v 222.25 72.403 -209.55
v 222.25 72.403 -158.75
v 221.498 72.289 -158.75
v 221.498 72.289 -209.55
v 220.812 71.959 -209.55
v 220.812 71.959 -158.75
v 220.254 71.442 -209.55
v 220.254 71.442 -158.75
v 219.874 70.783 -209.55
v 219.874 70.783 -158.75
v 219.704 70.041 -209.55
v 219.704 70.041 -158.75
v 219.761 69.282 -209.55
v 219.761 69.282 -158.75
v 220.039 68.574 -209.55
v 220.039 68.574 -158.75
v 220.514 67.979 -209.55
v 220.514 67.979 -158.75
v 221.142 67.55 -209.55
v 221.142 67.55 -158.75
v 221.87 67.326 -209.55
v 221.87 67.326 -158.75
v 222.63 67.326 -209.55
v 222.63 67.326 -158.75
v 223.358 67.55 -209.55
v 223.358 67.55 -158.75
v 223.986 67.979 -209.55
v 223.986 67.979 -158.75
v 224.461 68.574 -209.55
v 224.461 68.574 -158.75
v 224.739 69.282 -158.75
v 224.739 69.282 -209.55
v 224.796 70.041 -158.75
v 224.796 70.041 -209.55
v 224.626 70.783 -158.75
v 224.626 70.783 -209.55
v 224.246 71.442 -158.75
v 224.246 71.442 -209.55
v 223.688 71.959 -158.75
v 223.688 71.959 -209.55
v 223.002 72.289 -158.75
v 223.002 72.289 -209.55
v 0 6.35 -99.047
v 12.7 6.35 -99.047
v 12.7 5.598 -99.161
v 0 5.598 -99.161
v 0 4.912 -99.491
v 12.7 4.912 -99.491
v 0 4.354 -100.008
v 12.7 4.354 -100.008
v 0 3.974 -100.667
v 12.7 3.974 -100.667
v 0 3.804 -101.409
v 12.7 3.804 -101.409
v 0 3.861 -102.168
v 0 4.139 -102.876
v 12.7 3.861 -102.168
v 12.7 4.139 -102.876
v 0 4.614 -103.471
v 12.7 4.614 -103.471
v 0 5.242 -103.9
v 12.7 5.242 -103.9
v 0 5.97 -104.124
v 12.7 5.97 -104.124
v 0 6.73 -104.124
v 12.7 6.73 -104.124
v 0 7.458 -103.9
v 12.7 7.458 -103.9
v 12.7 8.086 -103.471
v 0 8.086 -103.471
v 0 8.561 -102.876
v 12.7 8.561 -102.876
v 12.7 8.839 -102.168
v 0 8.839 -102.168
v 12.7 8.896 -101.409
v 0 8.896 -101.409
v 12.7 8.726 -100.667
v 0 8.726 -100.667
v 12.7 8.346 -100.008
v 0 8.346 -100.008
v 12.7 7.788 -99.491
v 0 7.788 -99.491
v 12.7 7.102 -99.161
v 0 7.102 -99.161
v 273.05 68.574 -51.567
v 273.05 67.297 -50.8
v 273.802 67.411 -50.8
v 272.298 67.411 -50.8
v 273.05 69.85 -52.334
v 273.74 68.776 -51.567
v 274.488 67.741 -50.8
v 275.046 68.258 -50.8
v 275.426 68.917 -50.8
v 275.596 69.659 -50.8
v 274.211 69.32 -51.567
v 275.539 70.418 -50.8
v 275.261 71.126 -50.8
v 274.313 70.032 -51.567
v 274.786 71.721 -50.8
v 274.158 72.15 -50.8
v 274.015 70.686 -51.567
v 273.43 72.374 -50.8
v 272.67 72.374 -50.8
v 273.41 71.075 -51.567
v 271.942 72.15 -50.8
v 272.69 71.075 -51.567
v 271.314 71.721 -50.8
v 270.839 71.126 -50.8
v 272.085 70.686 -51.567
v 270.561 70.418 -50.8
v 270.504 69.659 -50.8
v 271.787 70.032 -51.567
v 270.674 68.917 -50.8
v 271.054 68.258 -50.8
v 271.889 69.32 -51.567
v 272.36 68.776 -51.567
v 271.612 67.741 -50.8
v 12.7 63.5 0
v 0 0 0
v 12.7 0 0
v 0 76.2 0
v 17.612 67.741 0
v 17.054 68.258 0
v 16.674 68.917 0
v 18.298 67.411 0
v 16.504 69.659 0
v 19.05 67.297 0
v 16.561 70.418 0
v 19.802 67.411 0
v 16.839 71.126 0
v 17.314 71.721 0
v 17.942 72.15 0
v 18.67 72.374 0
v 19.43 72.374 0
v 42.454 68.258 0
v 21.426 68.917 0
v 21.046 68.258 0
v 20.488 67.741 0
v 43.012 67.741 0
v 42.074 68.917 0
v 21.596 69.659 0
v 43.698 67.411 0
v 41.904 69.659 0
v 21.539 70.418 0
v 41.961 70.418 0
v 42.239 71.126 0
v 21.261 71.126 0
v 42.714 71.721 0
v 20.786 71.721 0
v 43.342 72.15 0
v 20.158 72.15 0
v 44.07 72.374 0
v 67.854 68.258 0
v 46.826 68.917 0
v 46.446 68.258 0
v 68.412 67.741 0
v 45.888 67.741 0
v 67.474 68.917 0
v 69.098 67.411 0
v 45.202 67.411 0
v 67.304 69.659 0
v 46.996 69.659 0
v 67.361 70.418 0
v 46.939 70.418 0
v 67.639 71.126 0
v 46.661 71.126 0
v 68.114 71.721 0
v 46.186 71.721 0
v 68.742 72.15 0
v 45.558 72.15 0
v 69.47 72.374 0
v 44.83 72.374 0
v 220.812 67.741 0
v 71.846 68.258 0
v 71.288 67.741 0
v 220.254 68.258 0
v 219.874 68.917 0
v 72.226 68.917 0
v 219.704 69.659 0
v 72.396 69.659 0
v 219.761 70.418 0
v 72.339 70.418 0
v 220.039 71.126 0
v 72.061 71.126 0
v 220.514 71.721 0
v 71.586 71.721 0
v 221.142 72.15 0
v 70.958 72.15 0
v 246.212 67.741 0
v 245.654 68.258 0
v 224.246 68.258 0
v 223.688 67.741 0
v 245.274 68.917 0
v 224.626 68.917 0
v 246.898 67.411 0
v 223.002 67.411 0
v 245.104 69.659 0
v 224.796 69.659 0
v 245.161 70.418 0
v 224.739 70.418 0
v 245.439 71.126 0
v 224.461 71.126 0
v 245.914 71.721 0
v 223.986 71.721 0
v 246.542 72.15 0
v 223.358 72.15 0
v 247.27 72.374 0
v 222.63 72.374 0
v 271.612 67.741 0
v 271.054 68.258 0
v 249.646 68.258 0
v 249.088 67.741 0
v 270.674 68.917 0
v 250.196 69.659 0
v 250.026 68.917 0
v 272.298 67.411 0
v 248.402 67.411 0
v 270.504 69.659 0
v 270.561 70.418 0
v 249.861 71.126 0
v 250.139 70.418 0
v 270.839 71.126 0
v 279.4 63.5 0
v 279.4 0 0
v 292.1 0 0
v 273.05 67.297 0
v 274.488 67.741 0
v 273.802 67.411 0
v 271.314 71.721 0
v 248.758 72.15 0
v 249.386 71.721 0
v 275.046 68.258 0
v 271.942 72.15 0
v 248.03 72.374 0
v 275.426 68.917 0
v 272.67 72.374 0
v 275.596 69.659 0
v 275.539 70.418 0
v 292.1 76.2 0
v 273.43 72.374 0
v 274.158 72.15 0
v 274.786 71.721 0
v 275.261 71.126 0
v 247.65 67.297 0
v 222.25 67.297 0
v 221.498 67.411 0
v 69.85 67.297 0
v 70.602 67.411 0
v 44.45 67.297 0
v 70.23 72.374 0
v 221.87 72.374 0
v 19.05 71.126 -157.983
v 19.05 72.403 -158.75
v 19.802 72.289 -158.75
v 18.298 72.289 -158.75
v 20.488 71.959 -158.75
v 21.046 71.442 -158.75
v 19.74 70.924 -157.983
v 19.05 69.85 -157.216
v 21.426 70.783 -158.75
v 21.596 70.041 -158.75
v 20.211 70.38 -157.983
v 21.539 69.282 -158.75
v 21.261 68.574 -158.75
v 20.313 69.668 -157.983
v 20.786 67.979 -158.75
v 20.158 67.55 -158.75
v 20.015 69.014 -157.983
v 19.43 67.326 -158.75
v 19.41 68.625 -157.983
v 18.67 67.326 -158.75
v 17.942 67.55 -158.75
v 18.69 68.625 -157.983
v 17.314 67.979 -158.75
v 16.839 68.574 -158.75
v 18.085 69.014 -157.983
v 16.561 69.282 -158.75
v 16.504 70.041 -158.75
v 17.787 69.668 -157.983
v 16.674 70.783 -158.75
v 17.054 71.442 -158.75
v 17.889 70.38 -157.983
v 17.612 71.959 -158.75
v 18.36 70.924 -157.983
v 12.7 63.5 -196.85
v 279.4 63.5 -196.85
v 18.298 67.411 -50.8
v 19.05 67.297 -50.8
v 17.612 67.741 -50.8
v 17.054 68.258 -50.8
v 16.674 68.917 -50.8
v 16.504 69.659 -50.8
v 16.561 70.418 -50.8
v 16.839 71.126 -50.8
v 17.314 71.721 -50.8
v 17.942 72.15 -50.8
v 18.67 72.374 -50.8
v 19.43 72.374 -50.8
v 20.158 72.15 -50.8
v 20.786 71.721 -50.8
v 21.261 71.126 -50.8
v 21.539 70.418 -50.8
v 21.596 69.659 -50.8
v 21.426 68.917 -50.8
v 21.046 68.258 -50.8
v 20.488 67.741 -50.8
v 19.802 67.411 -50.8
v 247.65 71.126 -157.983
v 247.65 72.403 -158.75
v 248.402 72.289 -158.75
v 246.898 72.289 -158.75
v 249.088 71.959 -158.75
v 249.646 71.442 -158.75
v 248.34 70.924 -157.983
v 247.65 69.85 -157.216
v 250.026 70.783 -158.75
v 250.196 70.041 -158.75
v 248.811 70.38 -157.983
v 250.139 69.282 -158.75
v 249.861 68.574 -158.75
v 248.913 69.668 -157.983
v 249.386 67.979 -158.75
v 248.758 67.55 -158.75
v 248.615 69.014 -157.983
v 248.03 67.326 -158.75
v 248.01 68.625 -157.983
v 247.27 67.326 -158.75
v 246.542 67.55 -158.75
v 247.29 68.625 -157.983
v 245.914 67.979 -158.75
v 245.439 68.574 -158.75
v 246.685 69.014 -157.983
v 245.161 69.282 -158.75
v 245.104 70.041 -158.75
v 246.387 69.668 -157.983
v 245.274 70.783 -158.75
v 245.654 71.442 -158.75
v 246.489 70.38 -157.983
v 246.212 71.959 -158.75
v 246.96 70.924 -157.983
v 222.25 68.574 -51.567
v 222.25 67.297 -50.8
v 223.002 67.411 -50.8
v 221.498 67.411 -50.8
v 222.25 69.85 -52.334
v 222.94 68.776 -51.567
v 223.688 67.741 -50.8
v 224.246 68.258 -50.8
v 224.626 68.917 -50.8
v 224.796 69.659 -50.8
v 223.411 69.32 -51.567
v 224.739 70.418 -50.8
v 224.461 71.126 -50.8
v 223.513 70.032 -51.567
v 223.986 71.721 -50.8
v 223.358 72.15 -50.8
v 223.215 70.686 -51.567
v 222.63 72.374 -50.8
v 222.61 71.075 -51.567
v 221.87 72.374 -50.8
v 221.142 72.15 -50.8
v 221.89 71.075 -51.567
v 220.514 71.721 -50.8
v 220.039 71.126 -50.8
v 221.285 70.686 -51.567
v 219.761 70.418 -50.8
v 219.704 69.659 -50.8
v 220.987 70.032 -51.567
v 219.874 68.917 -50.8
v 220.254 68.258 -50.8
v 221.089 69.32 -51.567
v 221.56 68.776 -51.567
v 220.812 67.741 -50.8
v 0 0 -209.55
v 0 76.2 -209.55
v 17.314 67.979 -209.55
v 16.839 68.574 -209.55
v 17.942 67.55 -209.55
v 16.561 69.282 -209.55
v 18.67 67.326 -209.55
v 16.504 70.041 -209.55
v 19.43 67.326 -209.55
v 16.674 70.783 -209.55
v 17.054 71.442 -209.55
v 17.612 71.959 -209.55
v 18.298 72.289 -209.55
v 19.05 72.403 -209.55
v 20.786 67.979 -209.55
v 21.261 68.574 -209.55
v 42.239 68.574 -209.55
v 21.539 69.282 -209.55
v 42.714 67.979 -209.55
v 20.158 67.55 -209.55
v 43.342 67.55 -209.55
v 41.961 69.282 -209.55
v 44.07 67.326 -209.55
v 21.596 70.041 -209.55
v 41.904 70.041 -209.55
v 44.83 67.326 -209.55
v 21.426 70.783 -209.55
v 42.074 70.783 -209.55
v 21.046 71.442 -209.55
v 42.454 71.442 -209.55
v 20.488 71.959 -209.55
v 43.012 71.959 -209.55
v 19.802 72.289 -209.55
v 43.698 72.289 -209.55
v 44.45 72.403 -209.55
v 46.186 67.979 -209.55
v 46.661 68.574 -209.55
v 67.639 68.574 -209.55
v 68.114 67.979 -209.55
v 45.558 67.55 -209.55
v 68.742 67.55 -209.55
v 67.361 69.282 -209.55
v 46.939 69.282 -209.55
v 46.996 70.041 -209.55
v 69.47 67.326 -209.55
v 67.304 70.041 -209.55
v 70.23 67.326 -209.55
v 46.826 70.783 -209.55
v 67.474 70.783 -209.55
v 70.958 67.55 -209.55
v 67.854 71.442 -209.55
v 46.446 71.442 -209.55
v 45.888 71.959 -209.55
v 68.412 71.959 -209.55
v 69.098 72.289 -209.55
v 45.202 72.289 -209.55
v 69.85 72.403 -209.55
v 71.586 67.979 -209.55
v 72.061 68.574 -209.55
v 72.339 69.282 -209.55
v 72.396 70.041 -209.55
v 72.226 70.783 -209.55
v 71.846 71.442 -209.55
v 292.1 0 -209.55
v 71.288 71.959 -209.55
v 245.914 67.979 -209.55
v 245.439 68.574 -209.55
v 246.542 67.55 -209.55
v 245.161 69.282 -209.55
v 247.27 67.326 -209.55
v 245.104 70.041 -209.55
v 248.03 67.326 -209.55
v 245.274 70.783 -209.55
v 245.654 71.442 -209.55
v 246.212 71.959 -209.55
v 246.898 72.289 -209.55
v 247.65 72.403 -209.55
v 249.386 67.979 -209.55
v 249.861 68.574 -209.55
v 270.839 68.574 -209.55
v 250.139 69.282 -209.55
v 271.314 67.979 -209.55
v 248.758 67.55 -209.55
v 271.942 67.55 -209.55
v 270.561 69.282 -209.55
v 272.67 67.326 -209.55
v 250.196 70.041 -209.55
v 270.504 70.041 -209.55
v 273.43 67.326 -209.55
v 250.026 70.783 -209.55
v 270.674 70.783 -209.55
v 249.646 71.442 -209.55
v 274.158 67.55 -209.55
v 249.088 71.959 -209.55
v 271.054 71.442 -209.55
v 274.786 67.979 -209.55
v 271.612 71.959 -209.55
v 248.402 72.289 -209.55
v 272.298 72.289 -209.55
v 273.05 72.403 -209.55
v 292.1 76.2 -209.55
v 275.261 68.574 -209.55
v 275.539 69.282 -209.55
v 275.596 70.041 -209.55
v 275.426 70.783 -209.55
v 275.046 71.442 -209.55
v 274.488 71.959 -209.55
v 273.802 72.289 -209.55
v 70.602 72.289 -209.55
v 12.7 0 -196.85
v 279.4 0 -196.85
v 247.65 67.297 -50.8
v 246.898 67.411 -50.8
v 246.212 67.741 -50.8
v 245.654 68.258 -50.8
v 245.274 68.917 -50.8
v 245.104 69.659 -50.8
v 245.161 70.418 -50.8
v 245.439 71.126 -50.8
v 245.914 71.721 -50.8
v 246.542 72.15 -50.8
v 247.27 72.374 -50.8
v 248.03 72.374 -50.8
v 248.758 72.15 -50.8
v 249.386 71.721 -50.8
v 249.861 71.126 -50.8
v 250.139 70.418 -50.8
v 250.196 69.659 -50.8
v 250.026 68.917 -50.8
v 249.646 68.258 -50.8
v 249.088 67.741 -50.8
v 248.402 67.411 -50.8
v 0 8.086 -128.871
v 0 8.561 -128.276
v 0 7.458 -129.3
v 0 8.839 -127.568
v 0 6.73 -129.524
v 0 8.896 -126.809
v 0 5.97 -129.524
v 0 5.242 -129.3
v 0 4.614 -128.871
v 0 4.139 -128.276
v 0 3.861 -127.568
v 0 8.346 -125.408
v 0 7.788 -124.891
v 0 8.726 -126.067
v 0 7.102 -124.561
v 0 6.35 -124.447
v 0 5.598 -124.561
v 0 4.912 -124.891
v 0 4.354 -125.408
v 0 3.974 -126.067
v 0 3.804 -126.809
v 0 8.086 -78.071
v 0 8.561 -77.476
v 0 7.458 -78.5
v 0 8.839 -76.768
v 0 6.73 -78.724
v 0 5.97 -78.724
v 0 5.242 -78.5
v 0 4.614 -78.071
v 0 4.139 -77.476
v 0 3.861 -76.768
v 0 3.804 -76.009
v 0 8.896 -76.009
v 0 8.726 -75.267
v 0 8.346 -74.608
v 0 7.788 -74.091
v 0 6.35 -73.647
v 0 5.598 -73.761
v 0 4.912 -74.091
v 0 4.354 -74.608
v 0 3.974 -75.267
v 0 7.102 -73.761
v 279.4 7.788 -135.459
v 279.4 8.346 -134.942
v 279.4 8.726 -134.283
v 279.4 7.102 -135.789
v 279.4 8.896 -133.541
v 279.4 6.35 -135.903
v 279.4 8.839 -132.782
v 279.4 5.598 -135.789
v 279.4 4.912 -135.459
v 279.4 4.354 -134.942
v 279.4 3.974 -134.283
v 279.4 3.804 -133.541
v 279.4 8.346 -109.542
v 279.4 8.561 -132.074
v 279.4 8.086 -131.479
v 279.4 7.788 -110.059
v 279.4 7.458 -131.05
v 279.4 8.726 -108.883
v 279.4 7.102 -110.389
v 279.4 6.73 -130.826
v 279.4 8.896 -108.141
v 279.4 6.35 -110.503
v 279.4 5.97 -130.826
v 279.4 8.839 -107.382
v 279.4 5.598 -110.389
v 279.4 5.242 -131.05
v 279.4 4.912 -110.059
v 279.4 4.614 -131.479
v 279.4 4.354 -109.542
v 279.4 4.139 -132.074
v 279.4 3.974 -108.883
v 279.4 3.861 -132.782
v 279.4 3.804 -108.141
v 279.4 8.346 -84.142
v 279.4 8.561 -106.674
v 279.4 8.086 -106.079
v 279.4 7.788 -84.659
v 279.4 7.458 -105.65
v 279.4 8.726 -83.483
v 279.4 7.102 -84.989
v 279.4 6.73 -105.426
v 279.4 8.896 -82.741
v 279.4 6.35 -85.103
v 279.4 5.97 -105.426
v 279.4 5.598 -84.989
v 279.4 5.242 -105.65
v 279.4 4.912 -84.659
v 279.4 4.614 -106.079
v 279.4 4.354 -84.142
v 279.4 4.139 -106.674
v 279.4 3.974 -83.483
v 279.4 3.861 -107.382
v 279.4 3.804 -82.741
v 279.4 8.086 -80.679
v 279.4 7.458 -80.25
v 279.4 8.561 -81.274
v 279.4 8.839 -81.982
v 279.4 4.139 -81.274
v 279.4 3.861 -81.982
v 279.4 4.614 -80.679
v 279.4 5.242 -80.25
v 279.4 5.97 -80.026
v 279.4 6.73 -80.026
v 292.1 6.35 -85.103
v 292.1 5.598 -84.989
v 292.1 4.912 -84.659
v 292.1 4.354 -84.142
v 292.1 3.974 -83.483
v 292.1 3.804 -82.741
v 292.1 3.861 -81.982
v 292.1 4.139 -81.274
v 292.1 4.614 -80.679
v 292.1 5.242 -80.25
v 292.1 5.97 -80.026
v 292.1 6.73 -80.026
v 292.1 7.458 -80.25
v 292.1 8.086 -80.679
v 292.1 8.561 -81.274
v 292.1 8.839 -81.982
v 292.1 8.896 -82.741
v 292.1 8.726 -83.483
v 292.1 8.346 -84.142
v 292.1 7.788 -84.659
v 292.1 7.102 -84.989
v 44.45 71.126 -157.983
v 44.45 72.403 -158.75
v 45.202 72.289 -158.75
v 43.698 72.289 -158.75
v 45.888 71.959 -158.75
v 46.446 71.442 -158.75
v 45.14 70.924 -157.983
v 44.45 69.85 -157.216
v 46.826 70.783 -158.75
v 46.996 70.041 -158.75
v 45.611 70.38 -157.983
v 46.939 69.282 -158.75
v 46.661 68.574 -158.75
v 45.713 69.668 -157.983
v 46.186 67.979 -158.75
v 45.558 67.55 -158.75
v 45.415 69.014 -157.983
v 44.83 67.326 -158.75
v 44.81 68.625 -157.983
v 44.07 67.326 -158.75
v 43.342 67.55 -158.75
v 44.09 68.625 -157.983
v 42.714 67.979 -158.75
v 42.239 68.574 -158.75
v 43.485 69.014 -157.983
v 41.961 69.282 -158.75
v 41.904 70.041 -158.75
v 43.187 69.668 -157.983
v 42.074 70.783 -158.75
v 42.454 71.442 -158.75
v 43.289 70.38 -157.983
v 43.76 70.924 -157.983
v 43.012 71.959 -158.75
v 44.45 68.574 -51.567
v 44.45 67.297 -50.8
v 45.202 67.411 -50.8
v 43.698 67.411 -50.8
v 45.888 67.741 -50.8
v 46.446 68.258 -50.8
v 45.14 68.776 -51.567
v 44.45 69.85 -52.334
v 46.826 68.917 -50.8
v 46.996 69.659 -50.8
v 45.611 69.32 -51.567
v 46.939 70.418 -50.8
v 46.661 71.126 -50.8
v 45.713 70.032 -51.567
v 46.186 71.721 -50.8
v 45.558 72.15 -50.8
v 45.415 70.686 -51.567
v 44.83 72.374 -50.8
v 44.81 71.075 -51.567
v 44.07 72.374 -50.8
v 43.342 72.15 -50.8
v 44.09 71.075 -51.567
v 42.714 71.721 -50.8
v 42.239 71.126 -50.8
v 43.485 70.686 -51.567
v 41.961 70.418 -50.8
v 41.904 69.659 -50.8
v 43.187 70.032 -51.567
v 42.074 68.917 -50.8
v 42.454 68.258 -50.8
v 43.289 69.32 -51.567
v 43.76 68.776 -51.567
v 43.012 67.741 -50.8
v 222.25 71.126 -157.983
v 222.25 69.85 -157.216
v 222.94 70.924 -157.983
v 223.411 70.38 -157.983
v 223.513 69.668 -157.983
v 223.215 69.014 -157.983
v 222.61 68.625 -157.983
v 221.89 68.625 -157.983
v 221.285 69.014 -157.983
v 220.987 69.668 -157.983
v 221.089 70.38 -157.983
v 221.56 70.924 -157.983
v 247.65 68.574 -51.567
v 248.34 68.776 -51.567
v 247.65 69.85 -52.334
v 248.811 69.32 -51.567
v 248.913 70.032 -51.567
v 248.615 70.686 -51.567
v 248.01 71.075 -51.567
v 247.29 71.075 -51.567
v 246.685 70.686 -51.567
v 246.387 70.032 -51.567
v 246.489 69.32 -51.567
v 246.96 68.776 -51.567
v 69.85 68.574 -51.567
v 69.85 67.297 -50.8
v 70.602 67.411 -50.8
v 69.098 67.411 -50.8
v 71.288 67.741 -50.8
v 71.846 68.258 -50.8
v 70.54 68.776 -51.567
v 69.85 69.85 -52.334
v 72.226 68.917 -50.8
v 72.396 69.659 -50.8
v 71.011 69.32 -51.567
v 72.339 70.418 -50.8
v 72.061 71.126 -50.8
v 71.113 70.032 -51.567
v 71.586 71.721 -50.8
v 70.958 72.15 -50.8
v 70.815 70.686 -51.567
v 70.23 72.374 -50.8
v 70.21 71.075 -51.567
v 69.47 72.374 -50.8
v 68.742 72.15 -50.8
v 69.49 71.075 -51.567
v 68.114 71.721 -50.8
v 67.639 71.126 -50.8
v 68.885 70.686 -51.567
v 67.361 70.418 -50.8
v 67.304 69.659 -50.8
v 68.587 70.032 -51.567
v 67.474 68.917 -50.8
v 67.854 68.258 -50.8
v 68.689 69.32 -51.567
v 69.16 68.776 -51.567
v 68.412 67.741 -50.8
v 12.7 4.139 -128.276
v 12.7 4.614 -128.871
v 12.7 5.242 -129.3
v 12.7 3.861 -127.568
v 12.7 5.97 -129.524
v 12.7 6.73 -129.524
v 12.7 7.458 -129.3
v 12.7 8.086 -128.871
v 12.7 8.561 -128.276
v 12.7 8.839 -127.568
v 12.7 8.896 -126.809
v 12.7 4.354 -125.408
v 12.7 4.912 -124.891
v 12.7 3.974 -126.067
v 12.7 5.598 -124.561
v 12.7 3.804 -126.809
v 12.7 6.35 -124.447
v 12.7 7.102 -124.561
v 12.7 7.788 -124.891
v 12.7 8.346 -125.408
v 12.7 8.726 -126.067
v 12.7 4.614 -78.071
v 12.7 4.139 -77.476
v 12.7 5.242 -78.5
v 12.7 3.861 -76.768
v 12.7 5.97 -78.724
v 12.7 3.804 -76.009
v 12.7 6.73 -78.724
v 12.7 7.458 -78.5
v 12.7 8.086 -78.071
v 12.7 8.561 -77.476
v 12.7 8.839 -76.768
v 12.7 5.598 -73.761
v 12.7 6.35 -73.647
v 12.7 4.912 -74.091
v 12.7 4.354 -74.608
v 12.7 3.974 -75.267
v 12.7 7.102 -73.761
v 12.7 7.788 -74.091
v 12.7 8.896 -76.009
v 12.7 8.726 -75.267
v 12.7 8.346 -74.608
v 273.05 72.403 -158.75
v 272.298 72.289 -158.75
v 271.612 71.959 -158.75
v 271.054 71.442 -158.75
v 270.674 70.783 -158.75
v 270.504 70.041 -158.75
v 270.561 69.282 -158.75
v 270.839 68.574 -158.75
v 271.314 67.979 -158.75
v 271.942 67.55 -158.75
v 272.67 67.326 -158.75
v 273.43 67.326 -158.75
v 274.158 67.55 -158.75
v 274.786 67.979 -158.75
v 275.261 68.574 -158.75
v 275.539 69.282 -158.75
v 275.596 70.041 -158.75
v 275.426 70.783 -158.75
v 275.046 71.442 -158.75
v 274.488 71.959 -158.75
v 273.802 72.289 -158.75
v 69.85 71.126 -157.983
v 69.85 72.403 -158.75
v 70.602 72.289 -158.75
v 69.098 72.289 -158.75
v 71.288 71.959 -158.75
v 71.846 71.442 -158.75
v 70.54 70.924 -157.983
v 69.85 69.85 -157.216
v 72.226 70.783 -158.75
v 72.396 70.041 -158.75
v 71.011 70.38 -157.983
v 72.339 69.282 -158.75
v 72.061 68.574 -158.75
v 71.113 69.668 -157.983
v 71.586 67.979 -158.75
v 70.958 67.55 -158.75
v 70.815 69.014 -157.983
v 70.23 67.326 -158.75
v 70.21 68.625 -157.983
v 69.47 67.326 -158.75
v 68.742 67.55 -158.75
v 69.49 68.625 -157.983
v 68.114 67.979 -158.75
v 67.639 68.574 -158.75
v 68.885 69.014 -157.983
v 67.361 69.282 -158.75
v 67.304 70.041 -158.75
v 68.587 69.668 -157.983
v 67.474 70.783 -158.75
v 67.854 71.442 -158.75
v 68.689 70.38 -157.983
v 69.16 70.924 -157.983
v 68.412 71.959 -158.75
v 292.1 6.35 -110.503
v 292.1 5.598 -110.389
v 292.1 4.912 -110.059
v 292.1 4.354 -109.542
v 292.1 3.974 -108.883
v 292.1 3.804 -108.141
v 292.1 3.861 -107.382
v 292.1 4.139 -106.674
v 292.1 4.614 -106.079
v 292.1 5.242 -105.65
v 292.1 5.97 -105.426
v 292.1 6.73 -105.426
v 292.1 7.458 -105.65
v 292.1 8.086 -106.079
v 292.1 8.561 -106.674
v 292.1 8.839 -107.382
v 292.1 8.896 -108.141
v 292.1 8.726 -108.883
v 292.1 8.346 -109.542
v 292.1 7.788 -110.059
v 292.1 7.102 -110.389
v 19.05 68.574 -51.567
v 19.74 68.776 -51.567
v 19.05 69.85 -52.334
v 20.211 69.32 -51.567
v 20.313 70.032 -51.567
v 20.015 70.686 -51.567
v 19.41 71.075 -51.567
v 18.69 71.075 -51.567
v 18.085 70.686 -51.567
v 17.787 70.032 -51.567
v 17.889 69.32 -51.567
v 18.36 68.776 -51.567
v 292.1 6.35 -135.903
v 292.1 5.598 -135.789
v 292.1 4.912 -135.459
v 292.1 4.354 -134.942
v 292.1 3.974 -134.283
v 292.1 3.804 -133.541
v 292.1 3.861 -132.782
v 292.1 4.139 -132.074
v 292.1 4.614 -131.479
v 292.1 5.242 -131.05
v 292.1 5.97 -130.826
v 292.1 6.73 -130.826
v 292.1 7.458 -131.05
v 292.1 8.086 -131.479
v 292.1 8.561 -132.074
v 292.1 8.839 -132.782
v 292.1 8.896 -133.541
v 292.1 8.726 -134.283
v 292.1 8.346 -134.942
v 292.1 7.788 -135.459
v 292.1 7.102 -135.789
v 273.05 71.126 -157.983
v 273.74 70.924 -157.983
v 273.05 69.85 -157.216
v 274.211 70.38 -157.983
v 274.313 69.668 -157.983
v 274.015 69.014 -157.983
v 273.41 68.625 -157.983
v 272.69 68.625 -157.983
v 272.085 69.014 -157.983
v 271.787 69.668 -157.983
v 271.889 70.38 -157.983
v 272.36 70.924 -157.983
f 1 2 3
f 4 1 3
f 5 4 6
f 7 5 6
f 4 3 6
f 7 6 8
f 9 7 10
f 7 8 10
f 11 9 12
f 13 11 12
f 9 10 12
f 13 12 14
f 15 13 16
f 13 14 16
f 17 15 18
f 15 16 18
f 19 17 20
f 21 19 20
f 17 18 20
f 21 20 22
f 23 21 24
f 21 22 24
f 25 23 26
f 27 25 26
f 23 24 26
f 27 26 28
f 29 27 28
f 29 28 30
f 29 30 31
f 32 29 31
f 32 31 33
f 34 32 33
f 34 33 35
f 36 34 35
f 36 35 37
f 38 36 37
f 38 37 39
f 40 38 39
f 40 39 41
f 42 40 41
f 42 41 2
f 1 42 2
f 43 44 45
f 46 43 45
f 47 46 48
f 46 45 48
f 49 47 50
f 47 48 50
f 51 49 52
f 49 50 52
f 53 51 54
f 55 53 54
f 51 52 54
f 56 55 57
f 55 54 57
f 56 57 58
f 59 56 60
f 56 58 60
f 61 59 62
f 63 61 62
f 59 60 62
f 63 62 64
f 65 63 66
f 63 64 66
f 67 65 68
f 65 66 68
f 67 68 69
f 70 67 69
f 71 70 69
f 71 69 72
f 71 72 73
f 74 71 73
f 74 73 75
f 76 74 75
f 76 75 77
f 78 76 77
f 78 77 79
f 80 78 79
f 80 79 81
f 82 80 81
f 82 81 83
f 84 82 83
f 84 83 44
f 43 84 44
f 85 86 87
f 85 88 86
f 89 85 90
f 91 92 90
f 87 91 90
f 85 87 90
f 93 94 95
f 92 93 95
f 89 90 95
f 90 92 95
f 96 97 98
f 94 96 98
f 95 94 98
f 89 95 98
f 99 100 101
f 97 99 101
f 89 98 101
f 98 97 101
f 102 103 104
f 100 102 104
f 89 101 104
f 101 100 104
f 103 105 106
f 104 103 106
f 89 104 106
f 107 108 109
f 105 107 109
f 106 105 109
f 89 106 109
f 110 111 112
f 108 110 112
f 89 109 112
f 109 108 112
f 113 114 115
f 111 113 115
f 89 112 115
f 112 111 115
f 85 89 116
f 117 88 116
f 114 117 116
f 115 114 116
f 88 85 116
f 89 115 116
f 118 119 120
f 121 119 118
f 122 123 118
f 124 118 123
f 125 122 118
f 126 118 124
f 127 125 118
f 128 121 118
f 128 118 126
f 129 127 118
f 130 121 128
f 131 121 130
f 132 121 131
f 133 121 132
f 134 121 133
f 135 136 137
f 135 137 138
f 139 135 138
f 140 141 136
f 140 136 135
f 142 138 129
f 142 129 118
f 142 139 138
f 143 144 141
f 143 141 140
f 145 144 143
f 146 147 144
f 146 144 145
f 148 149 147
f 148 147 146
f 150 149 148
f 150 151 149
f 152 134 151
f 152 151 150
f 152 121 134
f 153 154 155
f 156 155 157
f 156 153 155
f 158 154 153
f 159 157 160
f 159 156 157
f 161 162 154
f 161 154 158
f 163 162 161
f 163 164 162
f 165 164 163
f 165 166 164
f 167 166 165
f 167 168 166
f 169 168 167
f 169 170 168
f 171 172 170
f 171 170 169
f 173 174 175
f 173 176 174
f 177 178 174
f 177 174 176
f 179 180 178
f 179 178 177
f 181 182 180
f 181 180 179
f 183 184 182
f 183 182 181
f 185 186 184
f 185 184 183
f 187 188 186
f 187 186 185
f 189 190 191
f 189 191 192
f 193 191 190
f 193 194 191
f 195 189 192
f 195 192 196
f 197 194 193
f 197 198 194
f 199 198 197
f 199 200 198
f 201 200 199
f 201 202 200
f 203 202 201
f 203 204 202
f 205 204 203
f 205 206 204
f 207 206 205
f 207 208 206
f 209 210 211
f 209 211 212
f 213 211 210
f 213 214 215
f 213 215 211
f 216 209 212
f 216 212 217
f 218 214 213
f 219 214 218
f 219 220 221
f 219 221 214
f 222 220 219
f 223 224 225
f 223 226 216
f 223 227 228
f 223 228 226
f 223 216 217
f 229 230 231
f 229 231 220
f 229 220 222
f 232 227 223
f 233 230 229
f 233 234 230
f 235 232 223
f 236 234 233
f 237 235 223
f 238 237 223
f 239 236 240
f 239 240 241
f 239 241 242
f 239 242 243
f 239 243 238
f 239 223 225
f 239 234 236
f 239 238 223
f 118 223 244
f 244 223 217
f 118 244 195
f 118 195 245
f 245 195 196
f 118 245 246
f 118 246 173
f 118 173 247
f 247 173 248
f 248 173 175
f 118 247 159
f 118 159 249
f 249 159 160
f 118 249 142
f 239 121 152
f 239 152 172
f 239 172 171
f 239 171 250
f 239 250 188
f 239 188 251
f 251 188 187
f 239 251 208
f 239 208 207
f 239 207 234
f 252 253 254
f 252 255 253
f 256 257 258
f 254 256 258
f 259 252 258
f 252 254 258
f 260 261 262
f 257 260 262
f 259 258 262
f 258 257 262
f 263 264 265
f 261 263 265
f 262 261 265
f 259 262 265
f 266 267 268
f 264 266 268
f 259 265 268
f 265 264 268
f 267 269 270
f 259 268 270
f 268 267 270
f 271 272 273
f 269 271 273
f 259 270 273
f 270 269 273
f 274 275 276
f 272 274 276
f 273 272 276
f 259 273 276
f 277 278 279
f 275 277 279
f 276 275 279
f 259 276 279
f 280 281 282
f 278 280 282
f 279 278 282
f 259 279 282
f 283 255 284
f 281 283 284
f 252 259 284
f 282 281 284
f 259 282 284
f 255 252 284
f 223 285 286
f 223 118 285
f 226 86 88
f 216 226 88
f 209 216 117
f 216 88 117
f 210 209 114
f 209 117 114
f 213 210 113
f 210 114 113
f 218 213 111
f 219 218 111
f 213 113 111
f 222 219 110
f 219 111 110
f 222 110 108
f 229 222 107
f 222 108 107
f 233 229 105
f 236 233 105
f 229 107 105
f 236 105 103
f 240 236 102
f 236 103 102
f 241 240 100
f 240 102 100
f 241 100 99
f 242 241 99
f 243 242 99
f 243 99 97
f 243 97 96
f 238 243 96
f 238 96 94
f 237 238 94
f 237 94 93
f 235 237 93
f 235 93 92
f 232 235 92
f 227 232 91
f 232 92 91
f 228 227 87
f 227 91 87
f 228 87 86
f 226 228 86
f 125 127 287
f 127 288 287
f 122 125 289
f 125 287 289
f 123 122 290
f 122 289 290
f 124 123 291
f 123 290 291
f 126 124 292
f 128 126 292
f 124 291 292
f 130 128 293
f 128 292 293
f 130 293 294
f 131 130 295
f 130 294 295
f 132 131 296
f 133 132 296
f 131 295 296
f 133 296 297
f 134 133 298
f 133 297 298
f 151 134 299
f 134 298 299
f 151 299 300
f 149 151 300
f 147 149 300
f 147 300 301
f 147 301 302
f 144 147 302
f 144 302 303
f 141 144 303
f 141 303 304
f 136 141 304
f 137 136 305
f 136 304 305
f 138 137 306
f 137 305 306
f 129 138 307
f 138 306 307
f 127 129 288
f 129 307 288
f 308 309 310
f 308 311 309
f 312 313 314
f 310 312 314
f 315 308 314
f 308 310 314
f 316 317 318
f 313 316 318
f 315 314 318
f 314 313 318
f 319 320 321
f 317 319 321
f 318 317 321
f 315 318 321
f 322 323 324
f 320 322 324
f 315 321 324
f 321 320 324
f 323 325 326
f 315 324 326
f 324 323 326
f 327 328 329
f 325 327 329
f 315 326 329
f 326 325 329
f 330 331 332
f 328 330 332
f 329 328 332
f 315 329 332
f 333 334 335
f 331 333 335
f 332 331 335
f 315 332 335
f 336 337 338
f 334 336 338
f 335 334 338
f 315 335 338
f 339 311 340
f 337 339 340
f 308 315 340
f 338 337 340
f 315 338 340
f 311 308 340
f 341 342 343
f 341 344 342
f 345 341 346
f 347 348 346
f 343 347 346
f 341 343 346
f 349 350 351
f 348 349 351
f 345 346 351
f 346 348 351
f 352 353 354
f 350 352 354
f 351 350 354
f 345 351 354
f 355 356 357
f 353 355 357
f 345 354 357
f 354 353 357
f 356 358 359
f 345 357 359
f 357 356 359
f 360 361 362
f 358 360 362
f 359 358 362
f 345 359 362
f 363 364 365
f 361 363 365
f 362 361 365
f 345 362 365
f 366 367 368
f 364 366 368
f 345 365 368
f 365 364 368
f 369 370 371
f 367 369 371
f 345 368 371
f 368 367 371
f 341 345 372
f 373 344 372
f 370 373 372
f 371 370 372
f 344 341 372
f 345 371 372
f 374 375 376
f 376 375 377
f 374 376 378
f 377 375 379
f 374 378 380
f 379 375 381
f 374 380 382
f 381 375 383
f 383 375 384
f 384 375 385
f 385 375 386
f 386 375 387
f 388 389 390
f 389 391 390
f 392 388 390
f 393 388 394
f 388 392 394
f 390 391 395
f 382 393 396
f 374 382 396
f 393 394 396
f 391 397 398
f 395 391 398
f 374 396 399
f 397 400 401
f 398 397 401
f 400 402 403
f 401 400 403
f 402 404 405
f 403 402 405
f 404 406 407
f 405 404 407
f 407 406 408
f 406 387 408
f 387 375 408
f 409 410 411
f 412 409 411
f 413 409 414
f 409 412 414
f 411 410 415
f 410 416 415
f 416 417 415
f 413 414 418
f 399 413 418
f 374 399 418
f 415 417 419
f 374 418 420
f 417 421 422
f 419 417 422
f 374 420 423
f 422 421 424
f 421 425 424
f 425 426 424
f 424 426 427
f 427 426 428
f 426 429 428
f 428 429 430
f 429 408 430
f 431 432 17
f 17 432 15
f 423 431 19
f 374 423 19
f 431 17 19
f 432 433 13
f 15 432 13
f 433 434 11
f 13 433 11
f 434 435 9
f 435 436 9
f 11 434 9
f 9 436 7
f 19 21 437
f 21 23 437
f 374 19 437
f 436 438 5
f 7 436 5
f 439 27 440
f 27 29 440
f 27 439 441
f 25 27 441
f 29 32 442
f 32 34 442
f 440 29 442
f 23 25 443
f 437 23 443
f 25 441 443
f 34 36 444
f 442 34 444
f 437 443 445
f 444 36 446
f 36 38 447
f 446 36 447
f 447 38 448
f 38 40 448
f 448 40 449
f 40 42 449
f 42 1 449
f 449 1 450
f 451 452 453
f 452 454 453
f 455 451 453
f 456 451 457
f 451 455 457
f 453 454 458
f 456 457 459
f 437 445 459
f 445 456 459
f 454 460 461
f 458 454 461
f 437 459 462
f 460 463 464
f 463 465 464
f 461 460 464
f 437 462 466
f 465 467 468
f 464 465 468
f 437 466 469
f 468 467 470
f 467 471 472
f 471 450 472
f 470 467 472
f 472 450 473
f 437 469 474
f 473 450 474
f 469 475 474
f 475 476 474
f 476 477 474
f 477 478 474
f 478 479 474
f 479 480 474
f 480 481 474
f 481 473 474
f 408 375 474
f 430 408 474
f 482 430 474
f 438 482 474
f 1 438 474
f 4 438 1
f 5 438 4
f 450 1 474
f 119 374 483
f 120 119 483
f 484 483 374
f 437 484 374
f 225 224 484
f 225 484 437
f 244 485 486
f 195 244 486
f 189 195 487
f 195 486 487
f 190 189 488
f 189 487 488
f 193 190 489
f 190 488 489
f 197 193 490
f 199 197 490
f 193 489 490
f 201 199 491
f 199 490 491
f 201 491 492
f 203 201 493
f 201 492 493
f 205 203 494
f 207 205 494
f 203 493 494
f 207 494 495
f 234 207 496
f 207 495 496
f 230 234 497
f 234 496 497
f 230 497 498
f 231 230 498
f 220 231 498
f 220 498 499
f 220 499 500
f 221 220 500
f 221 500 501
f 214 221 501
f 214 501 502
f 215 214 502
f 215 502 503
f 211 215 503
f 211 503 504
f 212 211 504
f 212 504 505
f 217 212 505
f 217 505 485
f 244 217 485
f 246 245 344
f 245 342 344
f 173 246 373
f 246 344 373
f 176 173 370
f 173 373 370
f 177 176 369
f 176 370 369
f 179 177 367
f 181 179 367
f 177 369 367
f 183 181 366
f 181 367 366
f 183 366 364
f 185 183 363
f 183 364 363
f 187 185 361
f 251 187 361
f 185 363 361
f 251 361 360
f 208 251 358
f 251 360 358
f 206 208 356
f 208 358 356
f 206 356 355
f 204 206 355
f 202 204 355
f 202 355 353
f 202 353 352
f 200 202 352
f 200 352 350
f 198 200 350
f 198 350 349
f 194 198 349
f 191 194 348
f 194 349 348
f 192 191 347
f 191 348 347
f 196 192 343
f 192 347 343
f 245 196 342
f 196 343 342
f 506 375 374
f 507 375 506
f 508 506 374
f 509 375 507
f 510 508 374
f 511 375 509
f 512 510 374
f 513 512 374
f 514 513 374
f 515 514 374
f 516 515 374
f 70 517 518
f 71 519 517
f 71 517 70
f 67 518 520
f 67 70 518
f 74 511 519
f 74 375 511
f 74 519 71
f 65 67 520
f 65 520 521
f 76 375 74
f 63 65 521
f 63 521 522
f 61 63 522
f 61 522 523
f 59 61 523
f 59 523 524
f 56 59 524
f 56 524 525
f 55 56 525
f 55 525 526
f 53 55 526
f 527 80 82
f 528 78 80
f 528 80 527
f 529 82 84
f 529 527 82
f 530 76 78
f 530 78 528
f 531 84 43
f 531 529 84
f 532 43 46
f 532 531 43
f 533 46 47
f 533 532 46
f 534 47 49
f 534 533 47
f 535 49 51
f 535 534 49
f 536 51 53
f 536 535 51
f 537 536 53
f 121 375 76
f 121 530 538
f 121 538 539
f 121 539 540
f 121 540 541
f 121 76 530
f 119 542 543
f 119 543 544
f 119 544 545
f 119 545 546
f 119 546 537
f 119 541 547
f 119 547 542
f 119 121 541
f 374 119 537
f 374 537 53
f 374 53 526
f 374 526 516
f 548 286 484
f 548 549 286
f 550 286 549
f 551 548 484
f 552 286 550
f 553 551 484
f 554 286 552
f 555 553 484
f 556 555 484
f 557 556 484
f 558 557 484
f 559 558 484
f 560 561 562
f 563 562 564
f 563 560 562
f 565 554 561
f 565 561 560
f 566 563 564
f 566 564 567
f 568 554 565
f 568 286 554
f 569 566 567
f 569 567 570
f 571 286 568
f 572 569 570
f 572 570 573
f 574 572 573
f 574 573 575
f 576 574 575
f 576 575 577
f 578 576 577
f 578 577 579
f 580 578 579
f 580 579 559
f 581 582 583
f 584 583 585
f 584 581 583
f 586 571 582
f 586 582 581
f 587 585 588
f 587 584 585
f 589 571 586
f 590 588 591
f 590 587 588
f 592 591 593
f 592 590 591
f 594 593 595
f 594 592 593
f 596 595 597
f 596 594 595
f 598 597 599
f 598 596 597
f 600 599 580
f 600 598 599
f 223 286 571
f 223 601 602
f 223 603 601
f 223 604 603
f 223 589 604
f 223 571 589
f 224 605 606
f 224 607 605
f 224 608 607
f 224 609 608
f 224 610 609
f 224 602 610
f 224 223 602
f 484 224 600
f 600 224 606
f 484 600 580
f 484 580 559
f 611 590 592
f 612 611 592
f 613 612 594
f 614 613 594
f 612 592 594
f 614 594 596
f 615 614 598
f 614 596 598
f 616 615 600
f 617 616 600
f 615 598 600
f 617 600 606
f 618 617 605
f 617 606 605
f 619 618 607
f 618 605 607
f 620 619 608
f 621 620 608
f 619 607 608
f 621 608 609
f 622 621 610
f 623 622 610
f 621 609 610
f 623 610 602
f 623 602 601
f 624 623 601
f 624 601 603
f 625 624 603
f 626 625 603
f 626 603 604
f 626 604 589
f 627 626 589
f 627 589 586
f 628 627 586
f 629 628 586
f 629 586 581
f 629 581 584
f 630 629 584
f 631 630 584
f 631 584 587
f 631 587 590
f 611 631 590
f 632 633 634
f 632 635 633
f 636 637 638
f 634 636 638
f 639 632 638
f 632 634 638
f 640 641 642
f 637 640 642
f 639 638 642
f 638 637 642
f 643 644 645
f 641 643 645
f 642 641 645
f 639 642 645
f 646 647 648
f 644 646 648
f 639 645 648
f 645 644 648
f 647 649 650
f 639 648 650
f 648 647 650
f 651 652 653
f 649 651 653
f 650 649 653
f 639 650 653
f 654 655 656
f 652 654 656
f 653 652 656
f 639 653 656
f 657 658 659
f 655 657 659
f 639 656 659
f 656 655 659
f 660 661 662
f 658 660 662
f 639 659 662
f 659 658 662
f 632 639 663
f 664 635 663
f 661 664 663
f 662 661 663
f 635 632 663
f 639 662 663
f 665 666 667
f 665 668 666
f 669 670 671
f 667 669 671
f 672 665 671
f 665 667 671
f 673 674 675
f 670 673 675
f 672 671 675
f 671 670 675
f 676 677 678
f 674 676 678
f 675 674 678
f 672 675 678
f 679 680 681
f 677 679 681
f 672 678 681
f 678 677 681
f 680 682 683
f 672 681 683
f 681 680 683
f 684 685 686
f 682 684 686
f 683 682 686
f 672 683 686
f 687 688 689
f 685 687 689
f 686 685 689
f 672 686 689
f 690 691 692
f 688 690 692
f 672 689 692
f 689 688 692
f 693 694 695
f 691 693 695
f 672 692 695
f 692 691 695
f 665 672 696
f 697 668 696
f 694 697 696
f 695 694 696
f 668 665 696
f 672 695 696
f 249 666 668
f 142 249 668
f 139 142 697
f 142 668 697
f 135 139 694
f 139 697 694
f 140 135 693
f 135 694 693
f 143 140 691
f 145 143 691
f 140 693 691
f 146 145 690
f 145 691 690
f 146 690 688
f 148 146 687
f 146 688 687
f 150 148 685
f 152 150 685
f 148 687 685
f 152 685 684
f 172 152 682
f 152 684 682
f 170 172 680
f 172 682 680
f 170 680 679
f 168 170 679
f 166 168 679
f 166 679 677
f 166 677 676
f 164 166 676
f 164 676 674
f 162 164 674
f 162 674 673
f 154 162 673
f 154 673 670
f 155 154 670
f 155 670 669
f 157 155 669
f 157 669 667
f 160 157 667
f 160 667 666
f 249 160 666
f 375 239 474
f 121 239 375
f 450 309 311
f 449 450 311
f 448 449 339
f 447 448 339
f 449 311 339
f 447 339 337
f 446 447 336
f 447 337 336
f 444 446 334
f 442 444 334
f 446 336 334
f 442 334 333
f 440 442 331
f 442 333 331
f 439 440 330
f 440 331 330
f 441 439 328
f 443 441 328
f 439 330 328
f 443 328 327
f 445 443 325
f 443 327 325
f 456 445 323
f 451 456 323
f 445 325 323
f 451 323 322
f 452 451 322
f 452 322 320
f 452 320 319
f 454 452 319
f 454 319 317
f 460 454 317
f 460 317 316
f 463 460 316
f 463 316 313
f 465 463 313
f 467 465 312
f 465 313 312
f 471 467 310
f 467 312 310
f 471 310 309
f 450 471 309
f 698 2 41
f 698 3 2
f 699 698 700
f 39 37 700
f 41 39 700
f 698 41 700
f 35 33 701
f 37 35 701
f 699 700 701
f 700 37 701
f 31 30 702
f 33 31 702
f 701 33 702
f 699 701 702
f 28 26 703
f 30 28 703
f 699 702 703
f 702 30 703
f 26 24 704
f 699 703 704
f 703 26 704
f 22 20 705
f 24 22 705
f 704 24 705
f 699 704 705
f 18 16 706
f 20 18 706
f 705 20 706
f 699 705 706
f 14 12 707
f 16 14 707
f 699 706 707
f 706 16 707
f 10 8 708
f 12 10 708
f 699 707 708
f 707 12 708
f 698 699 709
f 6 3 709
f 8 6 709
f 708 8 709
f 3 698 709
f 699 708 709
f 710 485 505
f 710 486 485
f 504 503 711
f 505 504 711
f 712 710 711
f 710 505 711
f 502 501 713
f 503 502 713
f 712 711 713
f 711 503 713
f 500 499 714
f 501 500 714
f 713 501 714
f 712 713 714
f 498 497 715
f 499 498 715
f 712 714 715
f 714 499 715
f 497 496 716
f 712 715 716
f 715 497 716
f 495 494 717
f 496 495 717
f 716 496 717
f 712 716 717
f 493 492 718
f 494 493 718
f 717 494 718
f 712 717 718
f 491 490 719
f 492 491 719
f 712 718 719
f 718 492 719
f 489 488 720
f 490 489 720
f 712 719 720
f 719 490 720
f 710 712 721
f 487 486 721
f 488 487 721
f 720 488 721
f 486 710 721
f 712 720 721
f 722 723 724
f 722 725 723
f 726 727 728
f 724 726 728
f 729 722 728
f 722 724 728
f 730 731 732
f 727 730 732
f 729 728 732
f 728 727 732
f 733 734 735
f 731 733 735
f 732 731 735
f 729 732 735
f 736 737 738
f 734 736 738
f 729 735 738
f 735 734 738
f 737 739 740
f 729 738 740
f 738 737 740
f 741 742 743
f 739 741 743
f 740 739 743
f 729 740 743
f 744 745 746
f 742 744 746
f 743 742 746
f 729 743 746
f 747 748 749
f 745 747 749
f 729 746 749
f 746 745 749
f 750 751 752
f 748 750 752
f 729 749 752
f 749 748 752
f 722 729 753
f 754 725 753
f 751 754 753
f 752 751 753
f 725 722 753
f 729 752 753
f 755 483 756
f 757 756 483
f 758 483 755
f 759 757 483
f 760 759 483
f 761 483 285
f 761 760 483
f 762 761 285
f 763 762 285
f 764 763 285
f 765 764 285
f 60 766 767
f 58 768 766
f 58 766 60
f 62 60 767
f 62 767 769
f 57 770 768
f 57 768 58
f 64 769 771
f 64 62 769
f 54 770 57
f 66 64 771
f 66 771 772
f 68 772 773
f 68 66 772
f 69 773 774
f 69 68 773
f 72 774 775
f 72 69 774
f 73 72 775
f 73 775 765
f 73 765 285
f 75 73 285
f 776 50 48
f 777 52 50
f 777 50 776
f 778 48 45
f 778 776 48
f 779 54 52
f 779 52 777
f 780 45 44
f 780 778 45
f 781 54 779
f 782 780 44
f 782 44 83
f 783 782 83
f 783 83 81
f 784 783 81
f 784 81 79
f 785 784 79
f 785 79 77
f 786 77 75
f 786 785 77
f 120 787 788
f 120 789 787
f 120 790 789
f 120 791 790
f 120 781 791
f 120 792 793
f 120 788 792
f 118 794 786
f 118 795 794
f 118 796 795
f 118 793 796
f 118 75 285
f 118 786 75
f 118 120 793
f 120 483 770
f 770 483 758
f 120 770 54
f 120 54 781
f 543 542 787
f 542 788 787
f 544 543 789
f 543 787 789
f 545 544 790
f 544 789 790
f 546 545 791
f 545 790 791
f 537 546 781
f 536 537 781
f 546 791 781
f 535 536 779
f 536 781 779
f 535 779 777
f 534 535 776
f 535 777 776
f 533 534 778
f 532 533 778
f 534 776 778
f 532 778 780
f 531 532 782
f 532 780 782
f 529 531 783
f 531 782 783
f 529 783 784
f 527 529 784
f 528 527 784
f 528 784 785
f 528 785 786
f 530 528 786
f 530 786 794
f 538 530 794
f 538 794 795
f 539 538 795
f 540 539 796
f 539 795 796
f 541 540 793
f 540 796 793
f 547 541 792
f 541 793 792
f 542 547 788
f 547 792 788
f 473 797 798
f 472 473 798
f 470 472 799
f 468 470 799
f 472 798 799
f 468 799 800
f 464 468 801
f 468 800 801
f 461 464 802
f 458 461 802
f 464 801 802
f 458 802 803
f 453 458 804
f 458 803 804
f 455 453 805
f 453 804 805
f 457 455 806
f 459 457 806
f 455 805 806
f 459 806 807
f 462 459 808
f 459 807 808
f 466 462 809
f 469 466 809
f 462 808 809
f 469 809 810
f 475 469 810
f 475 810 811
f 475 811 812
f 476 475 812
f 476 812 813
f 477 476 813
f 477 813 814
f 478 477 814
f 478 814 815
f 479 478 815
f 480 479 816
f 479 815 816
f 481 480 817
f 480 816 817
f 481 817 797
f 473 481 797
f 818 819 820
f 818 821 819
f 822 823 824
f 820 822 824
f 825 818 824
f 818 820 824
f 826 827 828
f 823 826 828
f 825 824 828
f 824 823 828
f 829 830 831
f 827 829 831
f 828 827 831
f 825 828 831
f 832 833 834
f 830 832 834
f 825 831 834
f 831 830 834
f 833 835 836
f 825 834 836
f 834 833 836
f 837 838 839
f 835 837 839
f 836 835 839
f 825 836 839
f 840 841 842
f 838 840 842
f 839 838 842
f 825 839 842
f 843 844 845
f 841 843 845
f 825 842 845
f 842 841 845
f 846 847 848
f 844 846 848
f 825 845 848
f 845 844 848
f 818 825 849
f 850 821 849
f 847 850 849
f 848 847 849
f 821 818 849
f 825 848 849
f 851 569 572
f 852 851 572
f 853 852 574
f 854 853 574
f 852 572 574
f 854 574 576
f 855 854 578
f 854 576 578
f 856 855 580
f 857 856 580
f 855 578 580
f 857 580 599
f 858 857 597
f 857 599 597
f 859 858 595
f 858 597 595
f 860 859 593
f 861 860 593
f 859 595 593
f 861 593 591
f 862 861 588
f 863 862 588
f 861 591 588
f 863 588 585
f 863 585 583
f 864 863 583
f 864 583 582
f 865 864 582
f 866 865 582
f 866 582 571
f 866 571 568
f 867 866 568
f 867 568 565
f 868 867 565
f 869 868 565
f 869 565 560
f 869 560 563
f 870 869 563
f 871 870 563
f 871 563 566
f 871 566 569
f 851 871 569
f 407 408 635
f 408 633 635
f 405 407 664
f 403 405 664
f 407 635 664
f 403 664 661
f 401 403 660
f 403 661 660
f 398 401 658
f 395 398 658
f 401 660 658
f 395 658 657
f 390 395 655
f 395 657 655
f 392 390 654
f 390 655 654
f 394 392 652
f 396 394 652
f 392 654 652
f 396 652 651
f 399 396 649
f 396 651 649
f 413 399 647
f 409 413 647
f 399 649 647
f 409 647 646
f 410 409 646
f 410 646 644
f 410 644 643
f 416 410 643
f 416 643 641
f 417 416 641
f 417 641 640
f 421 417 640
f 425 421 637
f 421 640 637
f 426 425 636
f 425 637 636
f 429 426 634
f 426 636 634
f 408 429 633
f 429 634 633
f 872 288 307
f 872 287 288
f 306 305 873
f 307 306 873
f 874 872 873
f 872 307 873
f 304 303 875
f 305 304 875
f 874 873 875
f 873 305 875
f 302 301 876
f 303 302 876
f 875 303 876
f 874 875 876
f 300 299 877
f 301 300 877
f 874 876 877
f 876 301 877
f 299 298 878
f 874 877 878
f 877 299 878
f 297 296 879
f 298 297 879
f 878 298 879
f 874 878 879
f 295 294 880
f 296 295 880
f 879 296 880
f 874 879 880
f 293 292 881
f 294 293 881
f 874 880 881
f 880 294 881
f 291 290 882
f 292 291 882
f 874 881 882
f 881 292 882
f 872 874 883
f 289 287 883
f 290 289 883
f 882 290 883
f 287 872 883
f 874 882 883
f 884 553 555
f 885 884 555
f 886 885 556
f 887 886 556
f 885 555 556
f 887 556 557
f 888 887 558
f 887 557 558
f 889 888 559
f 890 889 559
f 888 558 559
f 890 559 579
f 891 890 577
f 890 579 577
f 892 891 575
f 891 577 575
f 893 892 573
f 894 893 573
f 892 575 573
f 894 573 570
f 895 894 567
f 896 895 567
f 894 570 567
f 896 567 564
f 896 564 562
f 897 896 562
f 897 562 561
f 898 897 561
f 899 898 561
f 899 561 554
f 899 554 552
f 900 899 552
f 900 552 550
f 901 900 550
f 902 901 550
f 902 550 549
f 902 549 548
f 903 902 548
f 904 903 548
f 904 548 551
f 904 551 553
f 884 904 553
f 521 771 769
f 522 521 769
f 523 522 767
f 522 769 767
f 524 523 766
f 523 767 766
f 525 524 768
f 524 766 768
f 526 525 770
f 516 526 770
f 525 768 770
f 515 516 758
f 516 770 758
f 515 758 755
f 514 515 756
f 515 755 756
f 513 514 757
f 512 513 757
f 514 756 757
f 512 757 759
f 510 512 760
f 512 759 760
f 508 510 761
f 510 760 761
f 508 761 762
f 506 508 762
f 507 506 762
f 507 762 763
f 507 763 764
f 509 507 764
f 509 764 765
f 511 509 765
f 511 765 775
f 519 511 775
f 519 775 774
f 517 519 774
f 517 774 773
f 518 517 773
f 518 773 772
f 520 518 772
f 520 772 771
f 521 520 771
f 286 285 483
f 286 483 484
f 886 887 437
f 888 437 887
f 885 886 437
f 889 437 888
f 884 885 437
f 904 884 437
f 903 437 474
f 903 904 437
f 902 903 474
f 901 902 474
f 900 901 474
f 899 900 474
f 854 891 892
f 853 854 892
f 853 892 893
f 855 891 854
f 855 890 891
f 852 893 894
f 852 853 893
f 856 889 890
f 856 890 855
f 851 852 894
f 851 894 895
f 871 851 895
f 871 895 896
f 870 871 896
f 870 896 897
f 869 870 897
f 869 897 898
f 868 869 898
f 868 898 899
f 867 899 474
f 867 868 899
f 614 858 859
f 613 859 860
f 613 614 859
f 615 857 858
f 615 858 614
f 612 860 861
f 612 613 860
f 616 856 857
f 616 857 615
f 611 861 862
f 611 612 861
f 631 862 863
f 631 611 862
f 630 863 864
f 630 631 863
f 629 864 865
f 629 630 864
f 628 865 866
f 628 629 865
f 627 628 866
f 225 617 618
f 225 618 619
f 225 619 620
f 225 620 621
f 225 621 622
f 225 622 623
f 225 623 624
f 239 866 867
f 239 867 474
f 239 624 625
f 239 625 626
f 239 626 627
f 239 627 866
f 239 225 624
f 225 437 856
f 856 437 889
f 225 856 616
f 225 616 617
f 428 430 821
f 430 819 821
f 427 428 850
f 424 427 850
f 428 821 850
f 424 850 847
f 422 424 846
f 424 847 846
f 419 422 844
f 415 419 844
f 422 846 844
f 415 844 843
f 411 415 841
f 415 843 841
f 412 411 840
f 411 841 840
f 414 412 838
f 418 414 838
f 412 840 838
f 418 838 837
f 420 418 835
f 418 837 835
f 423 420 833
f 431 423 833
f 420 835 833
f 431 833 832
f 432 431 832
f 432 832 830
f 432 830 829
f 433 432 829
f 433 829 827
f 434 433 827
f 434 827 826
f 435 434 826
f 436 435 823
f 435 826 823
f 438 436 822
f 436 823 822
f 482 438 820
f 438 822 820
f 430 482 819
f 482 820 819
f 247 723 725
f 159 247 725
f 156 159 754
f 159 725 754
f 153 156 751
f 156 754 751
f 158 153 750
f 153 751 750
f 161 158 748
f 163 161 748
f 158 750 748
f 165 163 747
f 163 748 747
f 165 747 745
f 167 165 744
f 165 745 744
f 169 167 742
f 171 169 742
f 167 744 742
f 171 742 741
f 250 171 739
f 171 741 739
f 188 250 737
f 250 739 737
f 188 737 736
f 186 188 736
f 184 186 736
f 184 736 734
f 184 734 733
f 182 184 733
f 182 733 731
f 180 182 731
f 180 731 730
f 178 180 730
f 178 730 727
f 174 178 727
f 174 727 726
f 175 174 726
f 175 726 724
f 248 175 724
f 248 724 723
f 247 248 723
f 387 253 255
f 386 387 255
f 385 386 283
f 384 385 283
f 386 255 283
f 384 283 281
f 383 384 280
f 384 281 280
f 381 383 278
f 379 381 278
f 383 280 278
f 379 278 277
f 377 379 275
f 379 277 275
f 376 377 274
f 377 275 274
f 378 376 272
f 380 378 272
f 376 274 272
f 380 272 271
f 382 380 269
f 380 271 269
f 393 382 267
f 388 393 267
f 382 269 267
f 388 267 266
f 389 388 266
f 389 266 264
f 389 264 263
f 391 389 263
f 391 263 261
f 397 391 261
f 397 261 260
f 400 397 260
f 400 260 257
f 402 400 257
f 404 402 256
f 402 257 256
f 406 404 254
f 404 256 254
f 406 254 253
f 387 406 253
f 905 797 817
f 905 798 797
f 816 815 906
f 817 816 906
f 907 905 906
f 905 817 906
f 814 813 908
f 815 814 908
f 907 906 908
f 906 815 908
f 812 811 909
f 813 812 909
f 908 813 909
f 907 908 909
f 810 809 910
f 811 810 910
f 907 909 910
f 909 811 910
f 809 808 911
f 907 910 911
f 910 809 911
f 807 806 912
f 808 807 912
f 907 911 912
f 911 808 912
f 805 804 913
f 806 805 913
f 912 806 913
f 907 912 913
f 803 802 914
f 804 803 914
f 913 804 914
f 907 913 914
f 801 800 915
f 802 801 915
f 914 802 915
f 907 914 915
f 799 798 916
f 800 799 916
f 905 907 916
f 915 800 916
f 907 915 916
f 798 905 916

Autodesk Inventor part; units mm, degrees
ref_plane "YZ Plane" through (0, 0, 0) normal (1, 0, 0) x (0, 1, 0)
ref_plane "XZ Plane" through (0, 0, 0) normal (0, 1, 0) x (-1, 0, 0)
ref_plane "XY Plane" through (0, 0, 0) normal (0, 0, 1) x (1, 0, 0)
sketch "TopBoxFrame" plane through (0, 0, 0) normal (0, 0, 1) x (1, 0, 0)
  line L0 (0, 0) -> (292.1, 0)
  line L1 (292.1, 0) -> (292.1, 76.2)
  line L2 (292.1, 76.2) -> (0, 76.2)
  line L3 (0, 76.2) -> (0, 0)
  dimension "d3" = 76.2
  dimension "d27" = 292.1
extrude "TopBoxWidth" add sketch "TopBoxFrame" against normal blind 209.55
sketch "TrayShape" plane through (0, 0, 0) normal (0, 0, 1) x (1, 0, 0)
  line L0 (12.7, 63.5) -> (279.4, 63.5)
  line L1 (279.4, 63.5) -> (279.4, 0)
  line L2 (279.4, 0) -> (12.7, 0)
  line L3 (12.7, 0) -> (12.7, 63.5)
  line L4 (292.1, 76.2) -> (0, 76.2) projected
  line L5 (0, 76.2) -> (0, 0) projected
  line L6 (292.1, 0) -> (292.1, 76.2) projected
  line L7 (0, 0) -> (292.1, 0) projected
  dimension "d4" = 12.7
  dimension "d5" = 12.7
  dimension "d6" = 12.7
  dimension "d9" = 0
extrude "TrayCut" cut sketch "TrayShape" against normal blind 196.85 contours L0 L1 L2 L3
sketch "HoleGeometry" plane through (0, 0, 0) normal (0, 0, 1) x (1, 0, 0)
  line L0 (292.1, 0) -> (292.1, 76.2) projected
  line L1 (279.4, 63.5) -> (279.4, 0) projected
  line L2 (279.4, 0) -> (292.1, 0) projected
  line L3 (292.1, 0) -> (292.1, 76.2) projected
  line L4 (292.1, 76.2) -> (0, 76.2) projected
  line L5 (0, 76.2) -> (0, 0) projected
  line L6 (0, 0) -> (12.7, 0) projected
  line L7 (12.7, 0) -> (12.7, 63.5) projected
  line L8 (12.7, 63.5) -> (279.4, 63.5) projected
  line L9 (292.1, 76.2) -> (292.1, 0) projected
  line L10 (292.1, 0) -> (0, 0) projected
  line L11 (0, 0) -> (0, 76.2) projected
  line L12 (0, 76.2) -> (292.1, 76.2) projected
  point P0 (273.05, 69.85)
  point P1 (247.65, 69.85)
  point P2 (222.25, 69.85)
  point P3 (69.85, 69.85)
  point P4 (44.45, 69.85)
  point P5 (19.05, 69.85)
  dimension "d35" = 19.05
  dimension "d38" = 25.4
  dimension "d45" = 203.2
  dimension "d108" = 6.35
hole "FrontPlateHoles" at (273.05, 69.85, 0) at (247.65, 69.85, 0) at (222.25, 69.85, 0) at (69.85, 69.85, 0) at (44.45, 69.85, 0) at (19.05, 69.85, 0) direction (0, 0, -1) diameter 5.1054 depth 50.8 tip angle 118 clearance for "Flat Head Machine Screw (82)" size "#10" standard "Ansi Unified Screw Threads"
sketch "BackHoleGeo" plane through (0, 0, -209.55) normal (0, 0, -1) x (-1, 0, 0)
  line L0 (-292.1, 76.2) -> (-292.1, 0) projected
  line L1 (-292.1, 0) -> (0, 0) projected
  line L2 (0, 0) -> (0, 76.2) projected
  line L3 (0, 76.2) -> (-292.1, 76.2) projected
  point P0 (-273.05, 69.85)
  point P1 (-247.65, 69.85)
  point P2 (-222.25, 69.85)
  point P3 (-69.85, 69.85)
  point P4 (-44.45, 69.85)
  point P5 (-19.05, 69.85)
  dimension "d57" = 19.05
  dimension "d60" = 25.4
  dimension "d67" = 203.2
  dimension "d107" = 6.35
hole "BackPlateHoles" at (273.05, 69.85, -209.55) at (247.65, 69.85, -209.55) at (222.25, 69.85, -209.55) at (69.85, 69.85, -209.55) at (44.45, 69.85, -209.55) at (19.05, 69.85, -209.55) direction (0, 0, 1) diameter 5.1054 depth 50.8 tip angle 118 clearance for "Flat Head Machine Screw (82)" size "#10" standard "Ansi Unified Screw Threads"
sketch "RightHoleGeo" plane through (292.1, 0, 0) normal (1, 0, 0) x (0, 0, -1)
  line L0 (0, 76.2) -> (209.55, 76.2) projected
  line L1 (0, 0) -> (0, 76.2) projected
  line L2 (0, 0) -> (209.55, 0) projected
  point P0 (82.55, 6.35)
  point P1 (107.95, 6.35)
  point P2 (133.35, 6.35)
  dimension "d80" = 82.55
  dimension "d83" = 25.4
  dimension "d104" = 6.35
hole "RightPlateHoles" at (292.1, 6.35, -82.55) at (292.1, 6.35, -107.95) at (292.1, 6.35, -133.35) direction (-1, 0, 0) diameter 5.1054 depth 50.8 tip angle 118 clearance for "Flat Head Machine Screw (82)" size "#10" standard "Ansi Unified Screw Threads"
sketch "LeftHoleGeo" plane through (0, 0, 0) normal (-1, 0, 0) x (0, 0, 1)
  line L0 (0, 76.2) -> (-209.55, 76.2) projected
  line L1 (-209.55, 0) -> (-209.55, 76.2) projected
  line L2 (0, 0) -> (-209.55, 0) projected
  point P0 (-127, 6.35)
  point P1 (-101.6, 6.35)
  point P2 (-76.2, 6.35)
  dimension "d96" = 82.55
  dimension "d99" = 25.4
  dimension "d105" = 6.35
hole "LeftPlateHoles" at (0, 6.35, -127) at (0, 6.35, -101.6) at (0, 6.35, -76.2) direction (1, 0, 0) diameter 5.1054 depth 50.8 tip angle 118 clearance for "Flat Head Machine Screw (82)" size "#10" standard "Ansi Unified Screw Threads"
equation "\"d5\" = d4"
equation "\"d6\" = d5"
properties part number "BatteryBoxV2-Top"
